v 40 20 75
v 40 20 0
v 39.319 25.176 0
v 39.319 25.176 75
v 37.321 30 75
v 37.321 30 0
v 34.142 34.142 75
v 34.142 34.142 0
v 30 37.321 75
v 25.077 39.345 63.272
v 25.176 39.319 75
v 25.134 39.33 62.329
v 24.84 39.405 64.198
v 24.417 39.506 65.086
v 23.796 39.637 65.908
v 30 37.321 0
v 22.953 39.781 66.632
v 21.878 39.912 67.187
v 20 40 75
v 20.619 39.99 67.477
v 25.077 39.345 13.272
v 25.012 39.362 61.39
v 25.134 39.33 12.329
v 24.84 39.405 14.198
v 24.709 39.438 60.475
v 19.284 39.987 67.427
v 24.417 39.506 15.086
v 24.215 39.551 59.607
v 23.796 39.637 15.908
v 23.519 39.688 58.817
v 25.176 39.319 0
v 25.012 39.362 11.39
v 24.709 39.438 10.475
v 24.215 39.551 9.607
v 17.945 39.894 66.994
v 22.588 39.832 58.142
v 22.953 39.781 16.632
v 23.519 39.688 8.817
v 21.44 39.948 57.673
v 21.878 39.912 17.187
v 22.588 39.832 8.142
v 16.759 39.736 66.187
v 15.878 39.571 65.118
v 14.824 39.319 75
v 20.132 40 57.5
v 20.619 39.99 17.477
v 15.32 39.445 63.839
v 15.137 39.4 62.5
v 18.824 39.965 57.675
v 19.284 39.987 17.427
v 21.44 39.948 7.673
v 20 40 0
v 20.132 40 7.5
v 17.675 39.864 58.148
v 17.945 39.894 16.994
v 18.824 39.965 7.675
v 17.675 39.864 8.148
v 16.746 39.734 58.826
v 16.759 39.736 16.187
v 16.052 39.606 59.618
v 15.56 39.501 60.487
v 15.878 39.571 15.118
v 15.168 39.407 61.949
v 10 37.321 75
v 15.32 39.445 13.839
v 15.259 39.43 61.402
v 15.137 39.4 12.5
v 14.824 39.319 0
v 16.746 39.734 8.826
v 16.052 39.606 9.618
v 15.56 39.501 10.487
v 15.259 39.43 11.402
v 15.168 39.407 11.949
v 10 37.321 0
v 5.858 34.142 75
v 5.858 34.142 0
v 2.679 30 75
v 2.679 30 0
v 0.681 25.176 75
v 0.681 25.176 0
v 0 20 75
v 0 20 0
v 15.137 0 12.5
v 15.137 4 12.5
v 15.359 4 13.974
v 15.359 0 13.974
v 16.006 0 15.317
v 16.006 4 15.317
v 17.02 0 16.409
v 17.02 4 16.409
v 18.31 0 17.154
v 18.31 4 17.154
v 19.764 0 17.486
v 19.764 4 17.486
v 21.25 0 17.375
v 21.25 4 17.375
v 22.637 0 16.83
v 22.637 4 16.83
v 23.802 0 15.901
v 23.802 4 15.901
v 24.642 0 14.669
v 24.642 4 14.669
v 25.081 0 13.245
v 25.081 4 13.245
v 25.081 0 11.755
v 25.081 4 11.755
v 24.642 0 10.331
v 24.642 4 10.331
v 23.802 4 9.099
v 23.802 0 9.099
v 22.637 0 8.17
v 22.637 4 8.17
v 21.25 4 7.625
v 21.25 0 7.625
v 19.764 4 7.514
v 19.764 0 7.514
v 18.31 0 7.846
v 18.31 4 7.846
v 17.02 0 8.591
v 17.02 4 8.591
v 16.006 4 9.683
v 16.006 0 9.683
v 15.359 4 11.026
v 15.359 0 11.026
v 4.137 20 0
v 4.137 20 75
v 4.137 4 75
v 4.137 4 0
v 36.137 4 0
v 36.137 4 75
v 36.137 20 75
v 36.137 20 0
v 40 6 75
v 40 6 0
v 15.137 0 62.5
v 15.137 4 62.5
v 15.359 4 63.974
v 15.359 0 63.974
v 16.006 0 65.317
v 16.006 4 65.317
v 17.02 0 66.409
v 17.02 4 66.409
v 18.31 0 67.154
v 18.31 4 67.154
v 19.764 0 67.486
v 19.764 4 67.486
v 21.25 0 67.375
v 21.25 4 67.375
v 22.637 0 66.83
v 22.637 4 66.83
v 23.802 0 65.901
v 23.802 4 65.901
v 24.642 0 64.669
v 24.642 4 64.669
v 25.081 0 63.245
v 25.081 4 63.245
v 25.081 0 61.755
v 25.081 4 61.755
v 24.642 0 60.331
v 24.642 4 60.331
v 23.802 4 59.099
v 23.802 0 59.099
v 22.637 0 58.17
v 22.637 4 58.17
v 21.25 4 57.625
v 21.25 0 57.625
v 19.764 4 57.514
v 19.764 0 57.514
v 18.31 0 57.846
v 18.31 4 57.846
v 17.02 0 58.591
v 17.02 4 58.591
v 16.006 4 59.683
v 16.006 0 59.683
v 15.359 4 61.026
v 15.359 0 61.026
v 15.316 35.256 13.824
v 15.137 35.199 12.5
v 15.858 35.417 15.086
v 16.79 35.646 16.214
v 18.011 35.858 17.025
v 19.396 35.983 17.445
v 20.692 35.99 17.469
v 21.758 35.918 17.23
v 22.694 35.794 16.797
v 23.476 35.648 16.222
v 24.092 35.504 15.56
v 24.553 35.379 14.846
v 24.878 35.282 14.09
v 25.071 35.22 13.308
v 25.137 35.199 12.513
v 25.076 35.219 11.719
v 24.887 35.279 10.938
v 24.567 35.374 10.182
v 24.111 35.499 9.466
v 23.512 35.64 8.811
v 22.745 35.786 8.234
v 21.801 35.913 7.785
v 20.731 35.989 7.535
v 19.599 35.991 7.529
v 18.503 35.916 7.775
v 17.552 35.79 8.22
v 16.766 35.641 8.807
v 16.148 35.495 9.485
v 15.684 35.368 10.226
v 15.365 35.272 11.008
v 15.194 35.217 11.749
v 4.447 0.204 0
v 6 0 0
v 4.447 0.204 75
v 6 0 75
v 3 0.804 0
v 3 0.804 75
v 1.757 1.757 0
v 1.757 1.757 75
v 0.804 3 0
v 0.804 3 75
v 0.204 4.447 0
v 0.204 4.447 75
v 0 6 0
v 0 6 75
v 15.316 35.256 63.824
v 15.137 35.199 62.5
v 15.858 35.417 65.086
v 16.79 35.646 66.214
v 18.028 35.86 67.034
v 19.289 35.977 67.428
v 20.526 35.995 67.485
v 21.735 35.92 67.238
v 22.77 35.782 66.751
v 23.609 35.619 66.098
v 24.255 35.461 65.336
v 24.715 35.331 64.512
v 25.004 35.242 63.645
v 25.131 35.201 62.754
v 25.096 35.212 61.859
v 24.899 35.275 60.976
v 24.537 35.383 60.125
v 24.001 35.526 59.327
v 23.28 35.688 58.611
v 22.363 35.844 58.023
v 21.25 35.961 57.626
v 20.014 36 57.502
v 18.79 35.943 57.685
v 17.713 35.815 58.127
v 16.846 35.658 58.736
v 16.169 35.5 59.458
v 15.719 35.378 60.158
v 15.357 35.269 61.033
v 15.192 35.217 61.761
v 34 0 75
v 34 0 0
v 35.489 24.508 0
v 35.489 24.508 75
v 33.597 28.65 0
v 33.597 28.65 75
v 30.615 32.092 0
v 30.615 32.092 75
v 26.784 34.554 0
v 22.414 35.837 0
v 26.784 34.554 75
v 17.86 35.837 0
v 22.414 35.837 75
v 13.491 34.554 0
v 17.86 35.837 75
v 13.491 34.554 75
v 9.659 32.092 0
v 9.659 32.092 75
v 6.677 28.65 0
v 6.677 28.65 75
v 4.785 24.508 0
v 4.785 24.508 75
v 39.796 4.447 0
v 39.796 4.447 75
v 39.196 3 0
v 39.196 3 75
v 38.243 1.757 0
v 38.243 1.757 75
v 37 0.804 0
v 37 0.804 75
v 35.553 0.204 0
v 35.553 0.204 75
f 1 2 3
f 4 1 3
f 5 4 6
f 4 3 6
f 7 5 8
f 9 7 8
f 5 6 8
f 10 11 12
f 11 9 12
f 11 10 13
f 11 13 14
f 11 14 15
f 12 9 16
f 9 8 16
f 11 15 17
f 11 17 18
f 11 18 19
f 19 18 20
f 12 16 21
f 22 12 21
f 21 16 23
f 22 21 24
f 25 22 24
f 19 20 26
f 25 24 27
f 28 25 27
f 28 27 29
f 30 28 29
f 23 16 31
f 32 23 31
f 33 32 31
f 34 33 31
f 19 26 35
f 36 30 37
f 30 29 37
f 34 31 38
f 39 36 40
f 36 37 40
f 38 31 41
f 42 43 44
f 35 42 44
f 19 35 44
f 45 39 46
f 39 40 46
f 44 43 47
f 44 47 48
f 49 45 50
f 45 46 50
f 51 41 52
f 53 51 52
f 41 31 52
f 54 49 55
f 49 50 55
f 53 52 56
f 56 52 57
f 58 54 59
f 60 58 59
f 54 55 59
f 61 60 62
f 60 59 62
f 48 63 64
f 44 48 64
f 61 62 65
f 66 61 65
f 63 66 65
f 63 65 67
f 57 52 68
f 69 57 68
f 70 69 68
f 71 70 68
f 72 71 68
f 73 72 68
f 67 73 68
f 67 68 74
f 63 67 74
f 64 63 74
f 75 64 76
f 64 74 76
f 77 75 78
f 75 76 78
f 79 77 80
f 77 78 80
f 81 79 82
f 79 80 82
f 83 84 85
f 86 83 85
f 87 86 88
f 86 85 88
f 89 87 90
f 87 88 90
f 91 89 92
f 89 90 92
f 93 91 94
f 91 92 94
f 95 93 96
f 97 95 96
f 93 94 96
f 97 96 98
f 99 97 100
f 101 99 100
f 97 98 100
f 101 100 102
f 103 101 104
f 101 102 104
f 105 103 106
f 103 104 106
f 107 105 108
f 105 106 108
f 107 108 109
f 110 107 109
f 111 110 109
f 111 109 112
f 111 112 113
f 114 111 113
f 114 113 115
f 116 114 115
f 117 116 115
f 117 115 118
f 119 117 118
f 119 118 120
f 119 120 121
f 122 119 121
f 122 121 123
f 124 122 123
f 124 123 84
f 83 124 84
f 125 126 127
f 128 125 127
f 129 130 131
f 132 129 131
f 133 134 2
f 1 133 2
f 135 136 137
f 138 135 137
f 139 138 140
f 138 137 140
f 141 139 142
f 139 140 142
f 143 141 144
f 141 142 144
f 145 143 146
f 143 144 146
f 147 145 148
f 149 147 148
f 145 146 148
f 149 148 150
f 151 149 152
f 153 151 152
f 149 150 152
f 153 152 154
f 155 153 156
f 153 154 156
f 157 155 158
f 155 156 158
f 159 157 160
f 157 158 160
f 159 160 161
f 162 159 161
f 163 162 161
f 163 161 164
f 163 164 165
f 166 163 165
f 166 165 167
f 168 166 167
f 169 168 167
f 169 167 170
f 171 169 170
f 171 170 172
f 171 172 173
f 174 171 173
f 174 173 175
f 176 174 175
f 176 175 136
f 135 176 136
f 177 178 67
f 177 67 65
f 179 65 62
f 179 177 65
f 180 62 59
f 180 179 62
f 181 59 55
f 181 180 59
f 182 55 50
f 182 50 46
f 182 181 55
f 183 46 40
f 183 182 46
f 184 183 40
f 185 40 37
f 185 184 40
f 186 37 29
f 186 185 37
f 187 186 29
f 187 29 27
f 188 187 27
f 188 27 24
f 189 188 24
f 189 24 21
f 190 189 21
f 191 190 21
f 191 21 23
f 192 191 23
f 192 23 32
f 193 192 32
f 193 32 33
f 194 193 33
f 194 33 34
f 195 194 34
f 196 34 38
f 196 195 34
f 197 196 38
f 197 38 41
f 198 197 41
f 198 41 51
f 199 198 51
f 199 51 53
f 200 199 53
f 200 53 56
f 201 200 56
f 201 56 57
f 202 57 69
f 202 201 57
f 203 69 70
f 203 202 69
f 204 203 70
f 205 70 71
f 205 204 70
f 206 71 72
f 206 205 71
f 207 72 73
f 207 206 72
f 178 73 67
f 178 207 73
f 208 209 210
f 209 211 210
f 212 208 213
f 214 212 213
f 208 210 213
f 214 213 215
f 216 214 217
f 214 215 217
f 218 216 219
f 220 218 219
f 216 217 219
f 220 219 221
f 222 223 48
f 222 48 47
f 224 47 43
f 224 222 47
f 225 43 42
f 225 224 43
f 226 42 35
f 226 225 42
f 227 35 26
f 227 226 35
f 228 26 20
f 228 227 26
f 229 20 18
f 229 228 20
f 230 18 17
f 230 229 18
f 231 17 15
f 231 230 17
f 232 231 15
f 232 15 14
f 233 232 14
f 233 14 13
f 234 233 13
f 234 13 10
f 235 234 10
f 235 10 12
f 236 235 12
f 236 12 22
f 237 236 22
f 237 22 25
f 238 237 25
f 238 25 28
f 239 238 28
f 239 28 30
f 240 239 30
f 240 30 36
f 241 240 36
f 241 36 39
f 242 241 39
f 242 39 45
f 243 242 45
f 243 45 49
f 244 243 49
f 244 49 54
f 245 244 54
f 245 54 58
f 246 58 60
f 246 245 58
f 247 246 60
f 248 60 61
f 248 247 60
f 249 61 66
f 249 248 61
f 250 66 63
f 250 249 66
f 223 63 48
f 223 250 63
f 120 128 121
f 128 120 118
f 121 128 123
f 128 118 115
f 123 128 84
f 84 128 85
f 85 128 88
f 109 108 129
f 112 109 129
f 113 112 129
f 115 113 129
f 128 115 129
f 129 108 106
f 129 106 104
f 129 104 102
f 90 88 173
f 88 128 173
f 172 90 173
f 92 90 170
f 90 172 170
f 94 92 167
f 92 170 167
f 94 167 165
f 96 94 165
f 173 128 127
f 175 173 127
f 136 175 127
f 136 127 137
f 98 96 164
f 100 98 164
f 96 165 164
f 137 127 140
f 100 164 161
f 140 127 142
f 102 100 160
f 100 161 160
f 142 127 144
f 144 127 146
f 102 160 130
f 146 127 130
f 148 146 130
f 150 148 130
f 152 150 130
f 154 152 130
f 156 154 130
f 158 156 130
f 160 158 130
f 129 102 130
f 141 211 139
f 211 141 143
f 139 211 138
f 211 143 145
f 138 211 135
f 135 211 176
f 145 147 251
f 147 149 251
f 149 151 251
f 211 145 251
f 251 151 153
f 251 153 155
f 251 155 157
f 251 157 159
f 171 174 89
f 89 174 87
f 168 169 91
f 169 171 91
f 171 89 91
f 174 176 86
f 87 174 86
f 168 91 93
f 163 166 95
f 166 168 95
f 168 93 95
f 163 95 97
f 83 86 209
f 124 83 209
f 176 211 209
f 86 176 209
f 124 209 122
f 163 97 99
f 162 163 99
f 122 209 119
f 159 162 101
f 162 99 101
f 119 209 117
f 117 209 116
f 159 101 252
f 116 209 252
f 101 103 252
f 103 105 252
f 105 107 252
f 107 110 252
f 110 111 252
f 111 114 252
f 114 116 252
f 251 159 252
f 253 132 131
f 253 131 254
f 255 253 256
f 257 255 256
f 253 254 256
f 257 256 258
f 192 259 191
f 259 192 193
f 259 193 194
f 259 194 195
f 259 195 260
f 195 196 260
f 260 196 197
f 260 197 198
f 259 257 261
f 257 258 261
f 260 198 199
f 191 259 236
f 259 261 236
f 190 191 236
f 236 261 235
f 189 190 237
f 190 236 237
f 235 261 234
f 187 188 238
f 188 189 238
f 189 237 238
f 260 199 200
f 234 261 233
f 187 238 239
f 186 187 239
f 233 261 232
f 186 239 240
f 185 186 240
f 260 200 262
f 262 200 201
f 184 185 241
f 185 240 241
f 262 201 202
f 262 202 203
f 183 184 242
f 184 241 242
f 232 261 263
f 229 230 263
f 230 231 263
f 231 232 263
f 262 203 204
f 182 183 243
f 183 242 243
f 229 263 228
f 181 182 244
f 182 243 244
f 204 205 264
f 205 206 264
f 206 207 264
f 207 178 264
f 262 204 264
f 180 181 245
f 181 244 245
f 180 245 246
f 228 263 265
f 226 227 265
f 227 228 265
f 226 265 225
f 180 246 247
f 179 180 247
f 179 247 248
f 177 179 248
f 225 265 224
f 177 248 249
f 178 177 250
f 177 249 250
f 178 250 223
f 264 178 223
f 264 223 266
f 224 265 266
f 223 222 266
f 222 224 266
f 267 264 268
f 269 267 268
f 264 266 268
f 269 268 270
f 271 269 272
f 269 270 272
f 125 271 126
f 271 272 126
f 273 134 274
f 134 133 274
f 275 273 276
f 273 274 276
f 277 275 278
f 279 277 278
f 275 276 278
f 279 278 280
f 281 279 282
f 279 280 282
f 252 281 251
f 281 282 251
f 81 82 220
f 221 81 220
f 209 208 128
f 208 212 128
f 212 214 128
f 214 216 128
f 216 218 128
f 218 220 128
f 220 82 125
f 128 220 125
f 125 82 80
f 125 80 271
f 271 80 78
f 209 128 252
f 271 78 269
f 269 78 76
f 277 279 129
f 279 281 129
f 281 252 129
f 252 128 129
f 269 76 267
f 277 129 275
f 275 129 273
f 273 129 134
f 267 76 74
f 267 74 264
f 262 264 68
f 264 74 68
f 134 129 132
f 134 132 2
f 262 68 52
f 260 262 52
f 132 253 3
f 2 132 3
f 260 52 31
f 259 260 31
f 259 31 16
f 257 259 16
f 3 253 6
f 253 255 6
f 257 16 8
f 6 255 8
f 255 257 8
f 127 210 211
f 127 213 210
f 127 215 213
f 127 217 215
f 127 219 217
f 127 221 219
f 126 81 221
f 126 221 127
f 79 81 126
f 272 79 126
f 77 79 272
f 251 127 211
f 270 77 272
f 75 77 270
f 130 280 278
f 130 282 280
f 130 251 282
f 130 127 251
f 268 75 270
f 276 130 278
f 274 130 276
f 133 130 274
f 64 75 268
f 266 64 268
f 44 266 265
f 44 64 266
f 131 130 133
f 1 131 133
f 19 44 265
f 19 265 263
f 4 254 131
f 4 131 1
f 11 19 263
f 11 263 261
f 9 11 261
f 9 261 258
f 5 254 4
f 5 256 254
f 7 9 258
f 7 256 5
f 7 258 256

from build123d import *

# Parameters (mm, degrees)
F1_DEPTH      = 75
F3_DEPTH      = 75
F5_R          = 6
F6_R          = 6
F4_R          = 5
F7_DEPTH      = 25
F7_DEPTH_BACK = 36.001


with BuildPart() as f1:
    # F0 (on Top) → F1 (new body)
    with BuildSketch(Plane.XY):
        with BuildLine():
            ThreePointArc((40, 20), (20, 40), (0, 20))
            Line((0, 20), (40, 20))
        make_face()
        with BuildLine():
            ThreePointArc((0, 20), (5.8578643763, 5.8578643763), (20, 0))
            ThreePointArc((20, 0), (34.1421356237, 5.8578643763), (40, 20))
            Line((40, 20), (0, 20))
        make_face()
        with BuildLine():
            ThreePointArc((40, 20), (34.1421356237, 5.8578643763), (20, 0))
            Line((20, 0), (40, 0))
            Line((40, 0), (40, 20))
        make_face()
        with BuildLine():
            Line((0, 20), (0, 0))
            Line((0, 0), (20, 0))
            ThreePointArc((20, 0), (5.8578643763, 5.8578643763), (0, 20))
        make_face()
    extrude(amount=F1_DEPTH)

    # F2 (on face) → F3 (cut)
    with BuildSketch(Plane.XY.offset(75)):
        with BuildLine():
            ThreePointArc((36.1371551045, 20), (20.1371551045, 36), (4.1371551045, 20))
            Line((4.1371551045, 20), (36.1371551045, 20))
        make_face()
        with BuildLine():
            Line((36.1371551045, 20), (4.1371551045, 20))
            ThreePointArc((4.1371551045, 20), (8.8234466055, 8.686291501), (20.1371551045, 4))
            ThreePointArc((20.1371551045, 4), (31.4508636035, 8.686291501), (36.1371551045, 20))
        make_face()
        with BuildLine():
            ThreePointArc((20.1371551045, 4), (8.8234466055, 8.686291501), (4.1371551045, 20))
            Line((4.1371551045, 20), (4.1371551045, 4))
            Line((4.1371551045, 4), (20.1371551045, 4))
        make_face()
        with BuildLine():
            Line((36.1371551045, 4), (36.1371551045, 20))
            ThreePointArc((36.1371551045, 20), (31.4508636035, 8.686291501), (20.1371551045, 4))
            Line((20.1371551045, 4), (36.1371551045, 4))
        make_face()
    extrude(amount=-F3_DEPTH, mode=Mode.SUBTRACT)

    # F5
    f5_edges = [f1.edges().sort_by_distance(p)[0] for p in [
        (40, 0, 37.5),
    ]]
    fillet(f5_edges, radius=F5_R)

    # F6
    f6_edges = [f1.edges().sort_by_distance(p)[0] for p in [
        (0, 0, 37.5),
    ]]
    fillet(f6_edges, radius=F6_R)

    # F4 (on face) → F7 (cut, two sides)
    with BuildSketch(Plane(origin=(0, 4, 0), x_dir=(-1, 0, 0), z_dir=(0, 1, 0))) as f7_sk:
        with Locations((-20.1371551045, 12.5)):
            Circle(F4_R)
        with Locations((-20.1371551045, 62.5)):
            Circle(F4_R)
    extrude(amount=-F7_DEPTH, mode=Mode.SUBTRACT)
    extrude(f7_sk.sketch, amount=F7_DEPTH_BACK, mode=Mode.SUBTRACT)


solid = f1.part
